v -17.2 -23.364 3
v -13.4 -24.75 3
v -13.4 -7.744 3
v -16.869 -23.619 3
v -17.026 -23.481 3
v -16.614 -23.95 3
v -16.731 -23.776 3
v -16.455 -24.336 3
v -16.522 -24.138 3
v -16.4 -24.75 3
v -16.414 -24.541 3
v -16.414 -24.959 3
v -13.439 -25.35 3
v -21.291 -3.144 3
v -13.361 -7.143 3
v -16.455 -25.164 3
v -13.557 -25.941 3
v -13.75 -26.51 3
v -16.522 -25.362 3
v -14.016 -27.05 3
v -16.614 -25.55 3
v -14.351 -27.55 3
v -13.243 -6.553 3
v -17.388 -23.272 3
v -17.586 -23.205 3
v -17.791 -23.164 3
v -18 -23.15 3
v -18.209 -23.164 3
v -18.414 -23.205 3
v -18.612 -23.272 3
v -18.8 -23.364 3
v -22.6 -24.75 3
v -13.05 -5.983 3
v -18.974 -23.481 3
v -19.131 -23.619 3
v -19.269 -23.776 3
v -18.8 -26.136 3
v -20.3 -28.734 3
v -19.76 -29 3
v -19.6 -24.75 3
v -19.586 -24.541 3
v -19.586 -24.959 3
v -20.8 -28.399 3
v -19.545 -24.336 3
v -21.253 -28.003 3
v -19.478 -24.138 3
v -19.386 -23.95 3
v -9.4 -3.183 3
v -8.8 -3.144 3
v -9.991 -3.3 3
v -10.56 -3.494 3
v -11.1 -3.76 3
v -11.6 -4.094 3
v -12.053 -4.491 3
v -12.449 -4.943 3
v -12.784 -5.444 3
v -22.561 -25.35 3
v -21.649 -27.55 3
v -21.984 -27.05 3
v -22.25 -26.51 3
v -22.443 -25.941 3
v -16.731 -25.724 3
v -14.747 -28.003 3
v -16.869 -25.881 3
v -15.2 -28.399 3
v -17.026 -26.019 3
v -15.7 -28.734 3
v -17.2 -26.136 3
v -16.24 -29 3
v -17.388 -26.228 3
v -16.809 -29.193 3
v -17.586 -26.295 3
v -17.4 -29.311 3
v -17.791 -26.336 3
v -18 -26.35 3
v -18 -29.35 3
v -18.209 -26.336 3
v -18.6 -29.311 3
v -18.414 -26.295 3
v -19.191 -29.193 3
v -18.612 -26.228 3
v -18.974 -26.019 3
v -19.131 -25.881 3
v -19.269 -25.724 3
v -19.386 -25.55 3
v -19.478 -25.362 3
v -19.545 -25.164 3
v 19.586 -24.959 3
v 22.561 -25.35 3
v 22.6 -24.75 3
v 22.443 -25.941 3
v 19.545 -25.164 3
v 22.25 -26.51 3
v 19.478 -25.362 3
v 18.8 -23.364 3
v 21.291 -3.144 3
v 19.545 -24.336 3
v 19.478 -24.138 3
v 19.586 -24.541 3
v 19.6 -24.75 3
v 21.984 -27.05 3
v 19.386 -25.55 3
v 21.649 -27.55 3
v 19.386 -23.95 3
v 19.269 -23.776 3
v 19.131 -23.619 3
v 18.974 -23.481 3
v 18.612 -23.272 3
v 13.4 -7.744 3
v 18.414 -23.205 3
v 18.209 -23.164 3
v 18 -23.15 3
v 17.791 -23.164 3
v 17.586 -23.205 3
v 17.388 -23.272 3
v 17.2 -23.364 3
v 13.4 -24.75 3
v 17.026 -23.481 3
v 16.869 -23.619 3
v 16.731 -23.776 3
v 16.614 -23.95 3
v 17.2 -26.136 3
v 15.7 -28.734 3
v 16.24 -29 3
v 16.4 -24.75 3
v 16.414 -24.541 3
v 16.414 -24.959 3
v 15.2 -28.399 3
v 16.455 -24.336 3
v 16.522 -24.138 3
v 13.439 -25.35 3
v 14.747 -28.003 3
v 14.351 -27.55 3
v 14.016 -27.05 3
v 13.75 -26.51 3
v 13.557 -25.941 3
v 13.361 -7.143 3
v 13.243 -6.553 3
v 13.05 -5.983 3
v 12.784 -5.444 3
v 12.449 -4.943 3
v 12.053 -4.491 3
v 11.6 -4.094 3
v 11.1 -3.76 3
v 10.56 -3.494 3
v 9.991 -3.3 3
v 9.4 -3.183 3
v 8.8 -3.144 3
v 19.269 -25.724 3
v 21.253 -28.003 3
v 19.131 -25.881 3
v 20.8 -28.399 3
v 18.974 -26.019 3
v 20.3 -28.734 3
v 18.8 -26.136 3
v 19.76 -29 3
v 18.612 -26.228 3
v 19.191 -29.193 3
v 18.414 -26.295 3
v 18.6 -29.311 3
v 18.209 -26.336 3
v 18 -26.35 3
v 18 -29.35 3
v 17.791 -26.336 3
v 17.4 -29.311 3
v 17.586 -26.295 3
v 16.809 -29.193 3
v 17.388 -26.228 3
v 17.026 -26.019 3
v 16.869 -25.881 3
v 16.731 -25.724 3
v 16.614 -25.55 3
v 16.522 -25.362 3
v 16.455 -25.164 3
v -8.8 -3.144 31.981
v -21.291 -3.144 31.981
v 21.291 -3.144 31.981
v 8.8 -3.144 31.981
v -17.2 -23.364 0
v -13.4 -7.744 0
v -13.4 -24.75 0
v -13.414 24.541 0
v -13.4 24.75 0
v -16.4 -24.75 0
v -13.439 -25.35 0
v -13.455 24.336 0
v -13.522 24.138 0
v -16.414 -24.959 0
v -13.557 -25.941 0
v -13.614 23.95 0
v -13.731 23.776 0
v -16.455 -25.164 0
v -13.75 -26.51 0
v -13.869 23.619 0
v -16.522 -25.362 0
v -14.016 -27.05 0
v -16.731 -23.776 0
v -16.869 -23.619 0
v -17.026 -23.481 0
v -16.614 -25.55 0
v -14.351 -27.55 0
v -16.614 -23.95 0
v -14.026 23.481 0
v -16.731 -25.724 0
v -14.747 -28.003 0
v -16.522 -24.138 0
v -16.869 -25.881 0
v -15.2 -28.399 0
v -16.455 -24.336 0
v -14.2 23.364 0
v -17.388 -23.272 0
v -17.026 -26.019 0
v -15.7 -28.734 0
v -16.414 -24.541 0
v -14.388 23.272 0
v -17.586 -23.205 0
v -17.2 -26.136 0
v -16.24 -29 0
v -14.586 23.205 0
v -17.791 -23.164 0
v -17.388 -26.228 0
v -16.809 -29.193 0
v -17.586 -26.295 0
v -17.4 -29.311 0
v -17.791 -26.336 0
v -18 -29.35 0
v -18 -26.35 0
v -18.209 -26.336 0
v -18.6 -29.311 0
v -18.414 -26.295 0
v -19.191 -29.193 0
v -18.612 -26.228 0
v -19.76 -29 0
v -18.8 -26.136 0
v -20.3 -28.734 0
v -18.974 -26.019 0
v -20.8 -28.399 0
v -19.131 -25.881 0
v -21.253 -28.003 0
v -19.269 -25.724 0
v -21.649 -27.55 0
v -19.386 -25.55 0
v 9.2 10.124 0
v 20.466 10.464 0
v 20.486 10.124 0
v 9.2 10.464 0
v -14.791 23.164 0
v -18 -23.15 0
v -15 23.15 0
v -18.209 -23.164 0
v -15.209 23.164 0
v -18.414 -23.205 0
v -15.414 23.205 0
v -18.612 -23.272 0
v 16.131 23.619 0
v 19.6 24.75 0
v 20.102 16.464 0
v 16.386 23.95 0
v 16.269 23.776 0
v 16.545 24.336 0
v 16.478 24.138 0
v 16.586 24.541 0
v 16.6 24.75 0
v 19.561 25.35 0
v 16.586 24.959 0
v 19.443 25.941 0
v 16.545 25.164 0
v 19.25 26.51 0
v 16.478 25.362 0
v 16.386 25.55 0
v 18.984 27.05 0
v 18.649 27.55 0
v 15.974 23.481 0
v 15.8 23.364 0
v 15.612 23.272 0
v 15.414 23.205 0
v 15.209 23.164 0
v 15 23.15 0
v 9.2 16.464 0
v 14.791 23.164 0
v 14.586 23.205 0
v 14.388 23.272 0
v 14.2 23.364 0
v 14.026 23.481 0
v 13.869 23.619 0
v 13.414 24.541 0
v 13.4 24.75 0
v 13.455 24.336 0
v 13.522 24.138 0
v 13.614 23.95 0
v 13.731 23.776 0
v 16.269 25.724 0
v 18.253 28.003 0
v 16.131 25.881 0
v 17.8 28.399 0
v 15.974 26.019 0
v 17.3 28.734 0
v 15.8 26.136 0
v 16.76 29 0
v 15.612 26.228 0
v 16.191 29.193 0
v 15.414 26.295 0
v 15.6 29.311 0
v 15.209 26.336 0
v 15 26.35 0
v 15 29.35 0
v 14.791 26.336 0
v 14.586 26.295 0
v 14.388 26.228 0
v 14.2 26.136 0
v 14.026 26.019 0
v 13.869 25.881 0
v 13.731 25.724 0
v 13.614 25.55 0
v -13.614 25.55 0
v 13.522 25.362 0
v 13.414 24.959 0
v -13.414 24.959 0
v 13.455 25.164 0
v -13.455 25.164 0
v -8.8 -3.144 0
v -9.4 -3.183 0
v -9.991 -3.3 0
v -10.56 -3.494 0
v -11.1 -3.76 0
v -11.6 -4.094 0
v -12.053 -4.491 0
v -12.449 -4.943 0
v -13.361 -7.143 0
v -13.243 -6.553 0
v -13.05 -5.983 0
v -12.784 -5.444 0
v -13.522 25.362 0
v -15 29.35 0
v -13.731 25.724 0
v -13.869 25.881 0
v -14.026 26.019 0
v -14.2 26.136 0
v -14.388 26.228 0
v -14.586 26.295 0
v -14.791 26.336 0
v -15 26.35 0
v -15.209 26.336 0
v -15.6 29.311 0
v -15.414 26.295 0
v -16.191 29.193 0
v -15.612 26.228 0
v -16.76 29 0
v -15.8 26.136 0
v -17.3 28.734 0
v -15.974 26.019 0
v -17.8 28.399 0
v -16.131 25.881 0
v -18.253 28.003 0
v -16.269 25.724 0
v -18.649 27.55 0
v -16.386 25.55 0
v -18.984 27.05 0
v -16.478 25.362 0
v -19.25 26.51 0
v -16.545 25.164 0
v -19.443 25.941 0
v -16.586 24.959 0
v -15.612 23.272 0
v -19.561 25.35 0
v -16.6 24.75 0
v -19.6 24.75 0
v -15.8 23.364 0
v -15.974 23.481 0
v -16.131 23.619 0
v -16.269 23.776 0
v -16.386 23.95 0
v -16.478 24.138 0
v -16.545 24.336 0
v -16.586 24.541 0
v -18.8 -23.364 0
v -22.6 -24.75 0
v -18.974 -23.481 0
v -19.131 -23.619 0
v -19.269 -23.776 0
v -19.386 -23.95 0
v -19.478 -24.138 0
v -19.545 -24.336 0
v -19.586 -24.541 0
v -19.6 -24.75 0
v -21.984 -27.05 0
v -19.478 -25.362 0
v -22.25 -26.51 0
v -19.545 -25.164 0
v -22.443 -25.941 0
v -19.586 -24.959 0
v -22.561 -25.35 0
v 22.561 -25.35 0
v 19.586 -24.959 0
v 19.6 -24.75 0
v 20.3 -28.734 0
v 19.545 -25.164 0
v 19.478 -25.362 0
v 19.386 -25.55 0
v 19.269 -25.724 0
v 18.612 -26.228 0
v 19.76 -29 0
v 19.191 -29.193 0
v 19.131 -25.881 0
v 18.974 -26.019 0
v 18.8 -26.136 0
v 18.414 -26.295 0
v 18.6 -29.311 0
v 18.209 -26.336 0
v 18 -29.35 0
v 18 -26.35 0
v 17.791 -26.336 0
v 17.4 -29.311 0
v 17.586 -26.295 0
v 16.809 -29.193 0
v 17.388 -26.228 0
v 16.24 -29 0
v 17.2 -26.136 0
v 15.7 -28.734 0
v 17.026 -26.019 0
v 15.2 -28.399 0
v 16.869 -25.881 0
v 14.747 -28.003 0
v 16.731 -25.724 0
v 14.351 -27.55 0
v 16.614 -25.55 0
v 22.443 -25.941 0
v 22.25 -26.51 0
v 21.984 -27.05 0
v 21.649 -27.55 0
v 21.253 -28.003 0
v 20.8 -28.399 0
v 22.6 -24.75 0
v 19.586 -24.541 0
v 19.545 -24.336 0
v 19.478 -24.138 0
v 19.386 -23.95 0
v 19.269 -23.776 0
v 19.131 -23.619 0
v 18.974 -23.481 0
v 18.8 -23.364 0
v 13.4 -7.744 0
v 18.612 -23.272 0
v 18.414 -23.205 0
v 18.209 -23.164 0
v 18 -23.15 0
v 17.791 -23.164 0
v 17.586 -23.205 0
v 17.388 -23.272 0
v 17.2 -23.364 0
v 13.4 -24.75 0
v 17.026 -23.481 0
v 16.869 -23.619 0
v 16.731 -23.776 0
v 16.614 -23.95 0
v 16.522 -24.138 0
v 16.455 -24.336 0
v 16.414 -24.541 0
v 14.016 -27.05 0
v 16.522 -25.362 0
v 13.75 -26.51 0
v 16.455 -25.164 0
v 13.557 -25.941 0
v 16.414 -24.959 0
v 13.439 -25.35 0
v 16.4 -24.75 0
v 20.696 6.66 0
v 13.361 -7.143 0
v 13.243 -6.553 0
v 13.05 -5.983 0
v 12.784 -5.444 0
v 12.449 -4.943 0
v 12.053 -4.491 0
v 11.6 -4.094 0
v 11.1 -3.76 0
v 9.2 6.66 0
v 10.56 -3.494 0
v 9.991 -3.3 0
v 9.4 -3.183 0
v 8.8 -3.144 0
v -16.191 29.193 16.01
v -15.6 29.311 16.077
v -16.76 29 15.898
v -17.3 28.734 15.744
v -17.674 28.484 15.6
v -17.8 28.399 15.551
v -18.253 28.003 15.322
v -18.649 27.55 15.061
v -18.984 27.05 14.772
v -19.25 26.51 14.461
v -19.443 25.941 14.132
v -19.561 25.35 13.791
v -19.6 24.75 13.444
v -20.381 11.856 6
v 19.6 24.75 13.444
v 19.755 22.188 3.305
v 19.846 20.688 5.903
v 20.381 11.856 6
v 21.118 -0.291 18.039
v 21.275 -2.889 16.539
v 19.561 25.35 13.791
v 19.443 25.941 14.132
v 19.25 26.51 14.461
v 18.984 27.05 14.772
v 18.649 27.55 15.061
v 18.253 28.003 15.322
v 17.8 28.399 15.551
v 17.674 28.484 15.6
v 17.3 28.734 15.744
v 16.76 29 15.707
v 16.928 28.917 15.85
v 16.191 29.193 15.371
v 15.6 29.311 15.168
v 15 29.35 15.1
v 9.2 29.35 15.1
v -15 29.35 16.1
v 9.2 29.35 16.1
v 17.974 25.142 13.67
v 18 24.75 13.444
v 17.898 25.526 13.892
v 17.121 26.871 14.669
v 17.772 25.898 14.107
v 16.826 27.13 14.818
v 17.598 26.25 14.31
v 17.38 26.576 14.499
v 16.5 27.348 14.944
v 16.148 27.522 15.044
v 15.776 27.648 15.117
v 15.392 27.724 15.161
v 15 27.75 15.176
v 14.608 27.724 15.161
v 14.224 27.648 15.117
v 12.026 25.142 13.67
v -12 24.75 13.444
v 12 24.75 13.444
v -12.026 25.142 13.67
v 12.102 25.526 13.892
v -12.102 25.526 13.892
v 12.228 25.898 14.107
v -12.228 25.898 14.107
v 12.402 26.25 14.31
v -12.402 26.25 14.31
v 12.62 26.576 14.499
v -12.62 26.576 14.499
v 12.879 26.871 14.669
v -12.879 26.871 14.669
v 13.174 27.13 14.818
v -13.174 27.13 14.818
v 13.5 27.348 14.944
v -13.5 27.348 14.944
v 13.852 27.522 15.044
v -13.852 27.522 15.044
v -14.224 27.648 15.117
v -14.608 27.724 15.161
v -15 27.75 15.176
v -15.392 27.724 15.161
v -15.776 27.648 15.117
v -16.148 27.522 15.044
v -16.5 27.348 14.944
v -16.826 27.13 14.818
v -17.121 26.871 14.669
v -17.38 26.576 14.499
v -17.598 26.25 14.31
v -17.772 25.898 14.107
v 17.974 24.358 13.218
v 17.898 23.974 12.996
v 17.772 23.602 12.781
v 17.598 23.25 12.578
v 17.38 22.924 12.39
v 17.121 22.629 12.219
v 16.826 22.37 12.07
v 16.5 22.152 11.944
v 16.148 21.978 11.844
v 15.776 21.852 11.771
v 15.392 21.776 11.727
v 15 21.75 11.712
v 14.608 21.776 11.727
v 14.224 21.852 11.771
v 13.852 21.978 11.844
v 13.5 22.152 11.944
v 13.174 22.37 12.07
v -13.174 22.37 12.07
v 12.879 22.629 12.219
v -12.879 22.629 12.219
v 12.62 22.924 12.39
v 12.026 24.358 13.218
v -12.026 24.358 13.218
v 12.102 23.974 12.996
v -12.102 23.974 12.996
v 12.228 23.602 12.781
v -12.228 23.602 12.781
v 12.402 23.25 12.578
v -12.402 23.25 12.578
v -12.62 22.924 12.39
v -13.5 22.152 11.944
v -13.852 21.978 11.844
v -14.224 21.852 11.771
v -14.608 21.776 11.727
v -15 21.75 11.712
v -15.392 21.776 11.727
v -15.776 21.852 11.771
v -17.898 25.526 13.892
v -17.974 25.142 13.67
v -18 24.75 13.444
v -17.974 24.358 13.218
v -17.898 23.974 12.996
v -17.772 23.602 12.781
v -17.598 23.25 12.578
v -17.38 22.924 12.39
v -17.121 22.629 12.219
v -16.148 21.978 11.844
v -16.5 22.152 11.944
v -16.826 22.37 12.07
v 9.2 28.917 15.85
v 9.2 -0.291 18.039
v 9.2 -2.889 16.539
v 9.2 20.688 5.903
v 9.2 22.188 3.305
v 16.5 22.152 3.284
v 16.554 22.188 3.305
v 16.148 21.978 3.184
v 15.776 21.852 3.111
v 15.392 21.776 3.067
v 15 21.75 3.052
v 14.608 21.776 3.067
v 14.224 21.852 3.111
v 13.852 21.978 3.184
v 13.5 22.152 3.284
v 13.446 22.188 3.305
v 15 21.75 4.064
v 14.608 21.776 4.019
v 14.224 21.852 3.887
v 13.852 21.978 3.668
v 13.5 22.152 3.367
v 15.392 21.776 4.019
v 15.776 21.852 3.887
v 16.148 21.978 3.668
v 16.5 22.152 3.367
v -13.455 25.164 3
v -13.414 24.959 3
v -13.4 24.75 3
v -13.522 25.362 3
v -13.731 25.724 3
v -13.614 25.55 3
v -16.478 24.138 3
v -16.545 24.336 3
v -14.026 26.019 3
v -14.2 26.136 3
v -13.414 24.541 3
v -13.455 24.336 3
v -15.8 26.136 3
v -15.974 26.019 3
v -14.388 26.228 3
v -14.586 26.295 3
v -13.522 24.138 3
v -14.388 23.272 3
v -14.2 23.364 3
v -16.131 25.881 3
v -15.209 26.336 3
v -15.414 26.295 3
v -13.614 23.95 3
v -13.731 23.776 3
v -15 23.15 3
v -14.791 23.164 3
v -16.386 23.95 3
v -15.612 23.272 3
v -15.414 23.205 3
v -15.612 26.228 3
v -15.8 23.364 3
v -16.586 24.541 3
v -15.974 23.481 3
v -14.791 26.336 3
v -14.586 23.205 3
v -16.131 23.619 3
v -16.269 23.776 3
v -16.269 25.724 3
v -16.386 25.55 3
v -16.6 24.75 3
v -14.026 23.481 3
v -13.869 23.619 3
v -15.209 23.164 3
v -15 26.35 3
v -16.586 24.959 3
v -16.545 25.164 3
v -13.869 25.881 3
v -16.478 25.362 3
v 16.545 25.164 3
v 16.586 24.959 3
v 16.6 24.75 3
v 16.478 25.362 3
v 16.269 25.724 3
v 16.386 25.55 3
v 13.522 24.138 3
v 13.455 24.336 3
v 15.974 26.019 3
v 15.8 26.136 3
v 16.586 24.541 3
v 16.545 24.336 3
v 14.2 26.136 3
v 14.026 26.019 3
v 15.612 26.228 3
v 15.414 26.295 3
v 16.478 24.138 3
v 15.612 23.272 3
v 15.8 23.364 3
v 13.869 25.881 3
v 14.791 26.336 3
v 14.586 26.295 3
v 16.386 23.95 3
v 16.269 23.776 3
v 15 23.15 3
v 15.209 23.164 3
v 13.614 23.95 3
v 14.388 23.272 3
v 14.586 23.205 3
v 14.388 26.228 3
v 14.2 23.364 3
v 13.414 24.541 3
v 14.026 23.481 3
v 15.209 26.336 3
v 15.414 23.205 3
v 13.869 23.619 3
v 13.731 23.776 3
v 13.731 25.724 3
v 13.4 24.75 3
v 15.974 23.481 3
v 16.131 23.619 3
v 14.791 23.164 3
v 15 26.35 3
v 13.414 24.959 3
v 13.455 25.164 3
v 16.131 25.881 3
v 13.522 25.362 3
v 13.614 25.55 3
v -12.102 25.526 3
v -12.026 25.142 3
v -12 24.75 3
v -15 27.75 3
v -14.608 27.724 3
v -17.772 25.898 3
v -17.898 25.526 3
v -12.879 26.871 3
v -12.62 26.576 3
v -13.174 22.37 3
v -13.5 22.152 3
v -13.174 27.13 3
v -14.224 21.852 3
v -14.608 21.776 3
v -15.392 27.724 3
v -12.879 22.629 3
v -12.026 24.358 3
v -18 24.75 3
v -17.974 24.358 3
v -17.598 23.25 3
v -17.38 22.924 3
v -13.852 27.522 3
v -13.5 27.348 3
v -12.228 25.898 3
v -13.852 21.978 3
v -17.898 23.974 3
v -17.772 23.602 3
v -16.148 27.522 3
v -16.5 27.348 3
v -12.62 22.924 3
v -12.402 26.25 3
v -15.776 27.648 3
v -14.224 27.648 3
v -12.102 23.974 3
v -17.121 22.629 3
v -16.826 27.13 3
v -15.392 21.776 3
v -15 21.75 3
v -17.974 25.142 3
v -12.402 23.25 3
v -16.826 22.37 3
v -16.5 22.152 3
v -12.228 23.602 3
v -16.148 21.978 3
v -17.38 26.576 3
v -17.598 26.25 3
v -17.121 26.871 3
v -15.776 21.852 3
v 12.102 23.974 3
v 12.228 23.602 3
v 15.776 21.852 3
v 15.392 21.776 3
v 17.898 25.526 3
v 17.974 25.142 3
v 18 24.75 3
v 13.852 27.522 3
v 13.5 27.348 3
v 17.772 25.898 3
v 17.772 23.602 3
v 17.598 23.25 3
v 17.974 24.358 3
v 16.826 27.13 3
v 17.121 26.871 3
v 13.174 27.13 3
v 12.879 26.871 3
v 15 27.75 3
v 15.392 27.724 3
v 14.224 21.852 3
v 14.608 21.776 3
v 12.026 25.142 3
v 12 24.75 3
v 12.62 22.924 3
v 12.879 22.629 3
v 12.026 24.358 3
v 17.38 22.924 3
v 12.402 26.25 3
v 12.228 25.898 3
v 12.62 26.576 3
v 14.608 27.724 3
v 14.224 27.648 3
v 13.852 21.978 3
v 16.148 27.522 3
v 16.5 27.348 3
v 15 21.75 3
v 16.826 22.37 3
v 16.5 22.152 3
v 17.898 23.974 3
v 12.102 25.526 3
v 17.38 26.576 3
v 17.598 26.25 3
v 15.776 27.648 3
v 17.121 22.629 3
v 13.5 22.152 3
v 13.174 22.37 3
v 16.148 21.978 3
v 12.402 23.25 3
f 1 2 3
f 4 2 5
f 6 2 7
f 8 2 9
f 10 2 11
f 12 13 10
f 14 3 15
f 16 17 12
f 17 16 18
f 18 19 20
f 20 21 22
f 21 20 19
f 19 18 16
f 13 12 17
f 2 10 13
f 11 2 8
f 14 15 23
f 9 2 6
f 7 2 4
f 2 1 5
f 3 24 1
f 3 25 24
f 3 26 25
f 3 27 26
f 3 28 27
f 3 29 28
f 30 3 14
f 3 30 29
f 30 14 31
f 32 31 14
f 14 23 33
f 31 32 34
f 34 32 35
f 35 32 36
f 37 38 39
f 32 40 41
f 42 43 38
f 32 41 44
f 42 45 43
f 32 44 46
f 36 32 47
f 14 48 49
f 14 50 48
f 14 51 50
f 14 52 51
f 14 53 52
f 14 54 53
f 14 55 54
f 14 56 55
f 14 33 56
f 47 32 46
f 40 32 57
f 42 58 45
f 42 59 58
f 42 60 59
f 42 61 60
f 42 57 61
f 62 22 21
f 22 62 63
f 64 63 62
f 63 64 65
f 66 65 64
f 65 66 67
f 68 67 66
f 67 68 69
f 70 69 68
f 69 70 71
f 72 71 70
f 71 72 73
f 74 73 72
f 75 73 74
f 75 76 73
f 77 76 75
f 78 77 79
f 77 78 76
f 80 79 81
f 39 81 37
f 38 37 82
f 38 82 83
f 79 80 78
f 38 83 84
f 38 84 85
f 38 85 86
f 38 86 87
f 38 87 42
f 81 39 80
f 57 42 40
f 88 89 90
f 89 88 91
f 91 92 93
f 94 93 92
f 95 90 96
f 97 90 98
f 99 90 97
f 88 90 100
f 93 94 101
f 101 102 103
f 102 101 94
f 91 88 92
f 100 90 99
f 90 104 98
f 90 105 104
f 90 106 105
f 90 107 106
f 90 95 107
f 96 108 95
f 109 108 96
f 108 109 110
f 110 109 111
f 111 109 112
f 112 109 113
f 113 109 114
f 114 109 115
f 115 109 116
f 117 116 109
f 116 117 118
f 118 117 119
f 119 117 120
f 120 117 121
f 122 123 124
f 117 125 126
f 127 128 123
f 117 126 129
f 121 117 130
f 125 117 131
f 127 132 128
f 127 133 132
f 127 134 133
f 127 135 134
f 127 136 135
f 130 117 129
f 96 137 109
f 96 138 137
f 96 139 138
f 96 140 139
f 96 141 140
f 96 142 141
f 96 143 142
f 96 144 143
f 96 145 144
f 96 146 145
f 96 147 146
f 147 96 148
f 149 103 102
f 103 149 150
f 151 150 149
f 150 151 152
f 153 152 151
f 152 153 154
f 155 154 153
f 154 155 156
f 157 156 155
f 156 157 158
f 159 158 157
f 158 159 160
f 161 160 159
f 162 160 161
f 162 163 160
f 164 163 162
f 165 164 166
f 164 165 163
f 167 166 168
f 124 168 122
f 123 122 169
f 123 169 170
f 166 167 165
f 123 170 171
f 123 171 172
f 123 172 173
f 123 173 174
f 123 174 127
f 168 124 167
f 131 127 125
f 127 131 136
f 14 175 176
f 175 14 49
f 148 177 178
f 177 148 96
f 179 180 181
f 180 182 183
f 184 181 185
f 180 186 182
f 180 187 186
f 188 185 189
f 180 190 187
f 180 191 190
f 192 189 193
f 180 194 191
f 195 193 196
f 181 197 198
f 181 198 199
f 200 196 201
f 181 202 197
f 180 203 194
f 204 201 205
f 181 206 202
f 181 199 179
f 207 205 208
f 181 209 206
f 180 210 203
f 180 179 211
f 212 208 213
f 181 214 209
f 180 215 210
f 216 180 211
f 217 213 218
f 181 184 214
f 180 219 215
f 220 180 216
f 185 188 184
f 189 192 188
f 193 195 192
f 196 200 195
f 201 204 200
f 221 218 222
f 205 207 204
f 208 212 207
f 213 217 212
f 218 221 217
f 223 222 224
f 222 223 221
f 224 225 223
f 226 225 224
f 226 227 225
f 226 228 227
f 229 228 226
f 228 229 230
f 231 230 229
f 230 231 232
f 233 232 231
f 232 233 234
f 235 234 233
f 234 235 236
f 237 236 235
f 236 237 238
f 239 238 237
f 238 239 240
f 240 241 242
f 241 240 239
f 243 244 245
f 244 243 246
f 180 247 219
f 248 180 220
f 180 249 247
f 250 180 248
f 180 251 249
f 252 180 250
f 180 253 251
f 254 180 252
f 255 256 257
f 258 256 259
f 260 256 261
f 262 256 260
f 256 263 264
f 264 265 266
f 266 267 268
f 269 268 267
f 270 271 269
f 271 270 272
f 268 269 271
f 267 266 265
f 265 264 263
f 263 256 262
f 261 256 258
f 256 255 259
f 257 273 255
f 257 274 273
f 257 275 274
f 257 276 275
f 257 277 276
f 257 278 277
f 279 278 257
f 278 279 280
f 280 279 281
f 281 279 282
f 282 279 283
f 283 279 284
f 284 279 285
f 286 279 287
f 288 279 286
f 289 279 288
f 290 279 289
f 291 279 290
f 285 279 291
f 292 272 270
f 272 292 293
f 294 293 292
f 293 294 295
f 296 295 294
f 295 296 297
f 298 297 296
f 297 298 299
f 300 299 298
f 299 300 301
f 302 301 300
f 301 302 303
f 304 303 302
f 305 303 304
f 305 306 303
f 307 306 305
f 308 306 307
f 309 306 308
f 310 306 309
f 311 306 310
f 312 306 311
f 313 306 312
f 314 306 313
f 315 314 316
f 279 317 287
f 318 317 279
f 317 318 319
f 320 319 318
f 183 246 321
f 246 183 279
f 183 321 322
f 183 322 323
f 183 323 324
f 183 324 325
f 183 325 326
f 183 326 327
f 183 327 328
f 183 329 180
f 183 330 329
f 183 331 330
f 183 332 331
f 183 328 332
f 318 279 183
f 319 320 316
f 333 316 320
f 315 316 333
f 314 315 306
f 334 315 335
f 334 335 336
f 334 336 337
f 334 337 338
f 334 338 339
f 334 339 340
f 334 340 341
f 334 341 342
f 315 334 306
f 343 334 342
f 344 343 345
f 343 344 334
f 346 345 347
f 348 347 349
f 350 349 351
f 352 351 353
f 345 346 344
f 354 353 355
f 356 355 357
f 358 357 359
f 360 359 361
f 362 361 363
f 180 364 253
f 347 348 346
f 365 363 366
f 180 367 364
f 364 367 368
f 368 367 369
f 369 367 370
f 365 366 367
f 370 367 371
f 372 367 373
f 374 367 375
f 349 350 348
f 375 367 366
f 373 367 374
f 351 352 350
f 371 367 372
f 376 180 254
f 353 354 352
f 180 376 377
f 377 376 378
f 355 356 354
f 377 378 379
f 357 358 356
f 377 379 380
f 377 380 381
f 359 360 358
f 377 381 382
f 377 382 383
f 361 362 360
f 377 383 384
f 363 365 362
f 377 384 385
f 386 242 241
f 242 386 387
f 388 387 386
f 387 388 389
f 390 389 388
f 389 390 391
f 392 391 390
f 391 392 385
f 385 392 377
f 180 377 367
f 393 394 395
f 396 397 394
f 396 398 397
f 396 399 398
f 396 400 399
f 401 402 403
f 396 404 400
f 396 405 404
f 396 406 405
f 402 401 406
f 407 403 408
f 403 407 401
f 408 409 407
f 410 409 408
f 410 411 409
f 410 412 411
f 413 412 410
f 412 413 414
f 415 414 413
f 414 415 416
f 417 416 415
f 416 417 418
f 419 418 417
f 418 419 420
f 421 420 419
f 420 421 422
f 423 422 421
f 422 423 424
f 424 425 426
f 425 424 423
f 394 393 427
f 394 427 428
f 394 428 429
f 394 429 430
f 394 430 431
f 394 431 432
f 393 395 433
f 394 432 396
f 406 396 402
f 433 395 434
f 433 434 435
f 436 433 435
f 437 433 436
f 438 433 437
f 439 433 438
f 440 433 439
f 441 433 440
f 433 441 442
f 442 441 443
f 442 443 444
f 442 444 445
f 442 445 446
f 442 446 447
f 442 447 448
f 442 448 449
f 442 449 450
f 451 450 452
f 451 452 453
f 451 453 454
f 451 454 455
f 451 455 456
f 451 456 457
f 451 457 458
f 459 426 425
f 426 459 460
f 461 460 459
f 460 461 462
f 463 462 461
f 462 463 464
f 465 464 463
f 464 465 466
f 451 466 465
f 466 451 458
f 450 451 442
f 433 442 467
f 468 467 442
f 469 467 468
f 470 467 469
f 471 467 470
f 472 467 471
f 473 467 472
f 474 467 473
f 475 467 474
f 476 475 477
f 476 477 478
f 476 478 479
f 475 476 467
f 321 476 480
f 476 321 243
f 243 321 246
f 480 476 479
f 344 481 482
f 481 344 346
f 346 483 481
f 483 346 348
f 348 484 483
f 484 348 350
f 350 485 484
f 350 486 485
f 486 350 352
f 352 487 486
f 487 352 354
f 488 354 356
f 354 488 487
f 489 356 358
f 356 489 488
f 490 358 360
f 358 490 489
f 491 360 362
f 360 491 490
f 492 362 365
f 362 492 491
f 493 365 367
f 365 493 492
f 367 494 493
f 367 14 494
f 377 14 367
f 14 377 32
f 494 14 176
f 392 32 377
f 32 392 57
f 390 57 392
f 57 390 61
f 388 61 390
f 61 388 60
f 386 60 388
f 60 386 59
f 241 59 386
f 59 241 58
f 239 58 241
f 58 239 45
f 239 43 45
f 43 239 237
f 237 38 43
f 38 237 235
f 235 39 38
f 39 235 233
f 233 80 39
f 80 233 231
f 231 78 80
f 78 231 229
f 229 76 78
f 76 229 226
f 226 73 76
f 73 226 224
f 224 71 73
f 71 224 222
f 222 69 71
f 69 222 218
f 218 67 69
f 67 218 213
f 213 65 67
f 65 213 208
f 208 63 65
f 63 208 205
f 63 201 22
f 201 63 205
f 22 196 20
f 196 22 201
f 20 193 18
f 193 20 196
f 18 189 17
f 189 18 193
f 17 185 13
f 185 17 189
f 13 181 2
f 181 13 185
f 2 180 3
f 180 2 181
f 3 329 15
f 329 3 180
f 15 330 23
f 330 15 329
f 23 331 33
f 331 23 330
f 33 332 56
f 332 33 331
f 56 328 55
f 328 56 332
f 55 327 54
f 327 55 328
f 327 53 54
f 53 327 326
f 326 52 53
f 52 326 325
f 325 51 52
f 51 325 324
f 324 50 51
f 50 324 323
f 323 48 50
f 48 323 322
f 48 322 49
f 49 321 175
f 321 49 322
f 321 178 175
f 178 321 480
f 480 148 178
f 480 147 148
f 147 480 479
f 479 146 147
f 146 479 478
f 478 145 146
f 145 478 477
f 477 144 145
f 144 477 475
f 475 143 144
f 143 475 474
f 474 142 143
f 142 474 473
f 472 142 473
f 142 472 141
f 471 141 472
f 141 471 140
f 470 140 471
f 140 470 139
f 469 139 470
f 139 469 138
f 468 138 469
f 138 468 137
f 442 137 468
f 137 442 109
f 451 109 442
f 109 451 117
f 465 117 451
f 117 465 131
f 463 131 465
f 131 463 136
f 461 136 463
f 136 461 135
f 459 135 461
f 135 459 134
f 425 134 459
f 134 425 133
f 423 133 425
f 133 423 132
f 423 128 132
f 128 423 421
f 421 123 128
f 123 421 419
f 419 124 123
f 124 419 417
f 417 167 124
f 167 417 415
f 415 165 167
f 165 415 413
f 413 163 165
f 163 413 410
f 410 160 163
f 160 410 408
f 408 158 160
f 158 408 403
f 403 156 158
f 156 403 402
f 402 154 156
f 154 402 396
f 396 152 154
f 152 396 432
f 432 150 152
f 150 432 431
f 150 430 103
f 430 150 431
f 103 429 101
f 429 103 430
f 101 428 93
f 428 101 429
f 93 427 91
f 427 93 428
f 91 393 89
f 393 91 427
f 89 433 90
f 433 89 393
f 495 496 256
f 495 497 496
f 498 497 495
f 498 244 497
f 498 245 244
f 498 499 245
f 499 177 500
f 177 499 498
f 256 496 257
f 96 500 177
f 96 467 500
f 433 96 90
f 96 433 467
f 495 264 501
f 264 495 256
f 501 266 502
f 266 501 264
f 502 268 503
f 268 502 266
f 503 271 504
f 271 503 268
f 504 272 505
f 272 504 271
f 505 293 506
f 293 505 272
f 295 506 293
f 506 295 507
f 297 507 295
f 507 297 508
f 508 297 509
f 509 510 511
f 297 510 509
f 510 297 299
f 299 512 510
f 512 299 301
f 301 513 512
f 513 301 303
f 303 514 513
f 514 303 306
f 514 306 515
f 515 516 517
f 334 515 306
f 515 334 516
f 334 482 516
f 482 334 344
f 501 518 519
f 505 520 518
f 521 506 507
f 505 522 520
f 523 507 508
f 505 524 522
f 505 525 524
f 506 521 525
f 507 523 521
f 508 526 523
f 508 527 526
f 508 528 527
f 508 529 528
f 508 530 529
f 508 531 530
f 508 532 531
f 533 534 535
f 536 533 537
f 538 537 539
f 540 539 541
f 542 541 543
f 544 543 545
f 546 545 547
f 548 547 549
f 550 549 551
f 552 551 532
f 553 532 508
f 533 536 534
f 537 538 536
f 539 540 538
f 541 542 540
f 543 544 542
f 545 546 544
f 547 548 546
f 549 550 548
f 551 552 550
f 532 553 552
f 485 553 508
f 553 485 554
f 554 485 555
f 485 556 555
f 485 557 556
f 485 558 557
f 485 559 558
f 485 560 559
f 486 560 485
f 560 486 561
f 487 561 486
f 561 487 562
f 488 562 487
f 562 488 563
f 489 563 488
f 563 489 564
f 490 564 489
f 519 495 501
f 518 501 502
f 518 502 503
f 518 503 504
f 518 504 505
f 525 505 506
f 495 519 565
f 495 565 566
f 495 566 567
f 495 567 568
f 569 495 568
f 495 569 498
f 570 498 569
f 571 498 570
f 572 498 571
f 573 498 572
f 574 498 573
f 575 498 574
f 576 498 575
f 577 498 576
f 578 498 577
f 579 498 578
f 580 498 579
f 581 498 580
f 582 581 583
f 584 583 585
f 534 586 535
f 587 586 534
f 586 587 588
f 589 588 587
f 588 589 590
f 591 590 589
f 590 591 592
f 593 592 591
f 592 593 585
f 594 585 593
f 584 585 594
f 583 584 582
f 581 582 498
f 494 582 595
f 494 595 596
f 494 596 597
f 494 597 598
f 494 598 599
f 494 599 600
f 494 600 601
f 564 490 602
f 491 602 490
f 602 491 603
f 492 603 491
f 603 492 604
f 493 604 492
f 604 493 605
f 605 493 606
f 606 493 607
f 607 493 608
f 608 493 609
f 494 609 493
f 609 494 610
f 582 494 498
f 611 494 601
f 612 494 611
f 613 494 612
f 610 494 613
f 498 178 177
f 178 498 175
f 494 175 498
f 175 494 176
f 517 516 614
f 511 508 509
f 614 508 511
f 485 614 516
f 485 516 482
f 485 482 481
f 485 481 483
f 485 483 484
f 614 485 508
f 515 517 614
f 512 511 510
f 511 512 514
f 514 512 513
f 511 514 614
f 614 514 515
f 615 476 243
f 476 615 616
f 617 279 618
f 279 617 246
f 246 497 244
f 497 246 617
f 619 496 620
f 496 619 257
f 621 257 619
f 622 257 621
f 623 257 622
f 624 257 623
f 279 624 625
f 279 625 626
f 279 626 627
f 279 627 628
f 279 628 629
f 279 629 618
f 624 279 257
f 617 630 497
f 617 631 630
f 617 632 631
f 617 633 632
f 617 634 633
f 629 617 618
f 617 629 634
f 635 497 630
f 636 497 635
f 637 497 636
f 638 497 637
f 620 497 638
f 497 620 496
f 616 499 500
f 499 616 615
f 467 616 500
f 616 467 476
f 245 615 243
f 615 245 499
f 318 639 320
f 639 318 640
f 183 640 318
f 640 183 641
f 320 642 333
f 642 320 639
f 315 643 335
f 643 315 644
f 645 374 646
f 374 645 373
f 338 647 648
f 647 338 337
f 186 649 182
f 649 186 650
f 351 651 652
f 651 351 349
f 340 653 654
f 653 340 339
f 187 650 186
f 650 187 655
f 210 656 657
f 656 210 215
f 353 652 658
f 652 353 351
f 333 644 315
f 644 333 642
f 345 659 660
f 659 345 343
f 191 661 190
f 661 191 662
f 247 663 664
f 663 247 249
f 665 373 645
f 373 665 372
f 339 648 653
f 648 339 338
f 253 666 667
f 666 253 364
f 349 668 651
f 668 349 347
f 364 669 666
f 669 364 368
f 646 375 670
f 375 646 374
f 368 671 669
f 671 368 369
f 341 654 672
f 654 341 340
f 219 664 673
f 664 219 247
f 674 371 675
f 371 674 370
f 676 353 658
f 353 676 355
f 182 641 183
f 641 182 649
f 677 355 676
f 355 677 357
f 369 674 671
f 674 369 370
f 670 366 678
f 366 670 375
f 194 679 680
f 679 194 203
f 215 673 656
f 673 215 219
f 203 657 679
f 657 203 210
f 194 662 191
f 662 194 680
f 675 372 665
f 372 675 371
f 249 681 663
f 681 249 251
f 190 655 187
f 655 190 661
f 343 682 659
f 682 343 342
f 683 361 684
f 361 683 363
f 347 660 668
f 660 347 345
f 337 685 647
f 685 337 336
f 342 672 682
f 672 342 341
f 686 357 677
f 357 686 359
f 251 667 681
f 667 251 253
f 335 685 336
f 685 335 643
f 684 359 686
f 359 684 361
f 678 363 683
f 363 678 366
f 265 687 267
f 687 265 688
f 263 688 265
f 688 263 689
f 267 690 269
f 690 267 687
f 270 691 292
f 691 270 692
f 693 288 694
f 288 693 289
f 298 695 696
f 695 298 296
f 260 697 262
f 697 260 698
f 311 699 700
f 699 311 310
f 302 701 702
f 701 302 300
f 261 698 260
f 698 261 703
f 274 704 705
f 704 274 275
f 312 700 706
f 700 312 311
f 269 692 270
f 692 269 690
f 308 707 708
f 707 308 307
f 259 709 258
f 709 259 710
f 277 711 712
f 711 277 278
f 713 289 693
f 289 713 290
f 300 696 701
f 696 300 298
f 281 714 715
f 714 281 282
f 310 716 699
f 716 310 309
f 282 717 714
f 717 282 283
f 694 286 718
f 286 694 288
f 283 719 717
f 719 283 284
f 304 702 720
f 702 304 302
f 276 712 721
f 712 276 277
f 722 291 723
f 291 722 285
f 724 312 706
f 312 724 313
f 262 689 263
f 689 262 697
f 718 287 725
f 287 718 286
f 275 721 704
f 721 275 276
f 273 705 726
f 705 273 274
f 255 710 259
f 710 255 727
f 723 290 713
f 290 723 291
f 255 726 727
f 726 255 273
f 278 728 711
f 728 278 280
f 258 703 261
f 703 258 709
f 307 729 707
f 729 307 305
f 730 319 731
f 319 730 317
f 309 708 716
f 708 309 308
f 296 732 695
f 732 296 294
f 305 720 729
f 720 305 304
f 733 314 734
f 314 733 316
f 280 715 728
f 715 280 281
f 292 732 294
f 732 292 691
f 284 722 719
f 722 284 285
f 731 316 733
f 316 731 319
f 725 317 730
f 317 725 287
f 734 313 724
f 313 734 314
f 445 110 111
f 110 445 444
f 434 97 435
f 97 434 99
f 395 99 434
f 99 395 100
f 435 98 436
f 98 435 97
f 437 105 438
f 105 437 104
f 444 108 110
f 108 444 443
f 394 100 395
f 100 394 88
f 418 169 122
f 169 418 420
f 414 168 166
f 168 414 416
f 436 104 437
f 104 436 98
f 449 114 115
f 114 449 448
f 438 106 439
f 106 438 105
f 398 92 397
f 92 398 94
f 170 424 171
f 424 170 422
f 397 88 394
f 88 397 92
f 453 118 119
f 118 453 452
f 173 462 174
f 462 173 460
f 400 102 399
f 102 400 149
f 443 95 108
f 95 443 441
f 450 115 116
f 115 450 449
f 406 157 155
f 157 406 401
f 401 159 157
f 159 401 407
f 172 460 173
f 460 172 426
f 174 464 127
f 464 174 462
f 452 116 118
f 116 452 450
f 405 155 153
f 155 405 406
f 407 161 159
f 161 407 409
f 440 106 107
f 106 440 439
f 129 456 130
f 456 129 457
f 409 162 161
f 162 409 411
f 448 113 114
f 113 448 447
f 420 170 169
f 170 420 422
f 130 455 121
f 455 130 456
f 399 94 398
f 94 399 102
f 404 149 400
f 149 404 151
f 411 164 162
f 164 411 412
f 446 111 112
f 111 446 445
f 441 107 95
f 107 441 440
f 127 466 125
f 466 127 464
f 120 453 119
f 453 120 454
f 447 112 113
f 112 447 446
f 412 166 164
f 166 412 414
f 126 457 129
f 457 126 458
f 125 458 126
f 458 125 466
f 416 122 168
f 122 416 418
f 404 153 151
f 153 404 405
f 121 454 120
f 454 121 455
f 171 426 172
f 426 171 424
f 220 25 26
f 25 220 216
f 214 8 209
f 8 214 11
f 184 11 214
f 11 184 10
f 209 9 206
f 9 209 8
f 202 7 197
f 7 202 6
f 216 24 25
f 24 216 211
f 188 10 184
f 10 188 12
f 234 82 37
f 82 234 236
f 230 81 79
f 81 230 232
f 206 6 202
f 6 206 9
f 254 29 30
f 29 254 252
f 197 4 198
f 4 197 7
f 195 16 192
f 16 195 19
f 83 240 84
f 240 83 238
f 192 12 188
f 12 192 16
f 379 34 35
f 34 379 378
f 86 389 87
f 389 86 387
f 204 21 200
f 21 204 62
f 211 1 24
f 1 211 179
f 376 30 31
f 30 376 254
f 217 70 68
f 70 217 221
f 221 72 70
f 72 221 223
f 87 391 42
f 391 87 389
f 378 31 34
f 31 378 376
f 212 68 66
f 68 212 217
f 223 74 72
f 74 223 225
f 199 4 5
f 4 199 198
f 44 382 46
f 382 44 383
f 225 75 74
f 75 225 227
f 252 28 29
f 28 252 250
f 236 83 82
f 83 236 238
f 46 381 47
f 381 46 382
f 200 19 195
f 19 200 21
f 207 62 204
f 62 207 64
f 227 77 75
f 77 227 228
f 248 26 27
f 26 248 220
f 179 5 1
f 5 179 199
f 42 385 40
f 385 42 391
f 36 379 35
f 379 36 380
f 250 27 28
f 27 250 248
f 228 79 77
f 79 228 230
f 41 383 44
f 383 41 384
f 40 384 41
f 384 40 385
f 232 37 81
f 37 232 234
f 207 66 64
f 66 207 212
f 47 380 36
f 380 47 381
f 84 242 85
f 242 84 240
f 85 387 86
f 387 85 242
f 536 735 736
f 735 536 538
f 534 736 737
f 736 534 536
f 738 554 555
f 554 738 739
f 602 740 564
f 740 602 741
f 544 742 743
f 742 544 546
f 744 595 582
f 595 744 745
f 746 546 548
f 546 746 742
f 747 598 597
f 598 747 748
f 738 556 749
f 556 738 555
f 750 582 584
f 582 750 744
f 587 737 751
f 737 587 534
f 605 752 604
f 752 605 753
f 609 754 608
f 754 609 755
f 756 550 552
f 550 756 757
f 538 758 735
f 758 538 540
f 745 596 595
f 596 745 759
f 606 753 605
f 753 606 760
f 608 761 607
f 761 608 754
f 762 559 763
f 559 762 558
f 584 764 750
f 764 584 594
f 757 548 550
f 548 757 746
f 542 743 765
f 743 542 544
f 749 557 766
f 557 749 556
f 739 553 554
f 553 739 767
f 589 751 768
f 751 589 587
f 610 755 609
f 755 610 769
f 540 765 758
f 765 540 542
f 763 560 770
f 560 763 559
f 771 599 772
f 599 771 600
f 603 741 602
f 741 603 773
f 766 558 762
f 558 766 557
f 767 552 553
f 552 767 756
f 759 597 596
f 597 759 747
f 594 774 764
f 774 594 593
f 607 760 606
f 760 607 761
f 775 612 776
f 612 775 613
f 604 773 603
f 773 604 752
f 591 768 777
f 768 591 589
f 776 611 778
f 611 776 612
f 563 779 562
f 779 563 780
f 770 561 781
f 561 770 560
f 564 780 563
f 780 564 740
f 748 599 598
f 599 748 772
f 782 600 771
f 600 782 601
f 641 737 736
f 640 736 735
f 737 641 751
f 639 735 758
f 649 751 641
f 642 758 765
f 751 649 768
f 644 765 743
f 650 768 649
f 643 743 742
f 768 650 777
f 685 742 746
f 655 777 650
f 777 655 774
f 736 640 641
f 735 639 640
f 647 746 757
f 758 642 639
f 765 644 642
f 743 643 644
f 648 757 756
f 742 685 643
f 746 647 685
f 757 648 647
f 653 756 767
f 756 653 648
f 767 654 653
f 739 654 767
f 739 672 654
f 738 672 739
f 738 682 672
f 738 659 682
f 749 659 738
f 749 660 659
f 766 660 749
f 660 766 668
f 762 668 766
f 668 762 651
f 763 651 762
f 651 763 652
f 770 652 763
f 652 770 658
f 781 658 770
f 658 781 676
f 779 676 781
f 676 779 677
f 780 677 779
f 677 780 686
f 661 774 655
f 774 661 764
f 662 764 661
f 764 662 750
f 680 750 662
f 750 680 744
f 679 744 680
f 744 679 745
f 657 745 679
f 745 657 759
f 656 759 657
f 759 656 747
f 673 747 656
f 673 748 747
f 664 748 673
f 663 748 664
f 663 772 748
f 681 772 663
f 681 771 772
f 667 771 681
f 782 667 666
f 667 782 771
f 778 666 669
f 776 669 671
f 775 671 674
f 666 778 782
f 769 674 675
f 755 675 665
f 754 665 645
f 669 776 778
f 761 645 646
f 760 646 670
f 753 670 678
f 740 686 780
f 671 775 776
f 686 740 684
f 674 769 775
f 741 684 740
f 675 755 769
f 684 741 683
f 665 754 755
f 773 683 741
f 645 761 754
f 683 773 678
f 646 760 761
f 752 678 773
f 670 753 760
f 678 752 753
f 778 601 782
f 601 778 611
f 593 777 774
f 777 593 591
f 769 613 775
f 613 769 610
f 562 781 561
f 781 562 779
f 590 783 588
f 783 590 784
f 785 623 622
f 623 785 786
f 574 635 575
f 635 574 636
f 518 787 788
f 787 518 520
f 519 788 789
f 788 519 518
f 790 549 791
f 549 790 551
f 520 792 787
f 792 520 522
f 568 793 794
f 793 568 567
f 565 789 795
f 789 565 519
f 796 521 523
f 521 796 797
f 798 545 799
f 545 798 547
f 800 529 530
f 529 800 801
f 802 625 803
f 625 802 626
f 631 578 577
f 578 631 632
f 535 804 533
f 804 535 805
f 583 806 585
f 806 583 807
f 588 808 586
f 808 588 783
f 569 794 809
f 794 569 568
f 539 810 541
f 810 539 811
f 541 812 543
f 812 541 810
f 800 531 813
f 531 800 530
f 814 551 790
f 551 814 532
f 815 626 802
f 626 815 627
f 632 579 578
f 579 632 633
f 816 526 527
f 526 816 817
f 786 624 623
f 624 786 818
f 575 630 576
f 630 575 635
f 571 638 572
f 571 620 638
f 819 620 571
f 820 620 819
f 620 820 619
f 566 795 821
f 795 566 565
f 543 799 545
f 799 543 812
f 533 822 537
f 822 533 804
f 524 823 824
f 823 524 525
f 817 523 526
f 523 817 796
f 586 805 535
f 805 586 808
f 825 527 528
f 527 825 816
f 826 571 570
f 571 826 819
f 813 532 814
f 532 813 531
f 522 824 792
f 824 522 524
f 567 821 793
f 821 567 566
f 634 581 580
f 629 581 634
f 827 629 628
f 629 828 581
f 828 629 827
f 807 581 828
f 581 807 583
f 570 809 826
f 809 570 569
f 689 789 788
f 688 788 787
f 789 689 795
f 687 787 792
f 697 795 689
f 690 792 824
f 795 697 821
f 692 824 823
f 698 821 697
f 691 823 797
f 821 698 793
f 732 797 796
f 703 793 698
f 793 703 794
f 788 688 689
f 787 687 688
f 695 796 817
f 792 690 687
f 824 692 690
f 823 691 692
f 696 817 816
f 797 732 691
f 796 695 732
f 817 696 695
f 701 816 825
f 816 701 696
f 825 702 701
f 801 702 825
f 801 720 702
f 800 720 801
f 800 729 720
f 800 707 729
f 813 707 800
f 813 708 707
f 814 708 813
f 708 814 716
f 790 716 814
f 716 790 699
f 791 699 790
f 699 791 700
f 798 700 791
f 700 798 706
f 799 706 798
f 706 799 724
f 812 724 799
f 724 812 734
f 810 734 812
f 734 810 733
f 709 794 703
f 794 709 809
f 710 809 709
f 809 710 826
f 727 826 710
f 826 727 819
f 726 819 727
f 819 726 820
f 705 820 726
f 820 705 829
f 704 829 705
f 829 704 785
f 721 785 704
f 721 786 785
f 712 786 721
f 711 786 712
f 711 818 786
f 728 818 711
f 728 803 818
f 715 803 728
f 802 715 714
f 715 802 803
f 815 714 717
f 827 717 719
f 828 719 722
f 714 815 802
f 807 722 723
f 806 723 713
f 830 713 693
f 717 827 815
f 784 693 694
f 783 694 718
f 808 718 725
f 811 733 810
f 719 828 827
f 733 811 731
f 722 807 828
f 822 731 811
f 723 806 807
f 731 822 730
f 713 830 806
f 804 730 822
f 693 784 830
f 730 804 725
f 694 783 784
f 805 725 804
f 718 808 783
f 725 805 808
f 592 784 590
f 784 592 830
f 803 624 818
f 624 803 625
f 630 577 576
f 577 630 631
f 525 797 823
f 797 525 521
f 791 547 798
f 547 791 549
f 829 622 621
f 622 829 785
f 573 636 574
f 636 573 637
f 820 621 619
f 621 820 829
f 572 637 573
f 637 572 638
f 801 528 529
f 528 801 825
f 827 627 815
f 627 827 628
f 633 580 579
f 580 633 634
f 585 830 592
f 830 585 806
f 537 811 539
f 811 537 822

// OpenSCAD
//Depth of camera
camera_depth = 20.2;
//Height of the supporting back
back_height = 30;
//C/C Distance between front holes
front_cc = 30;
//C/C Distance between rear holes
rear_cc = 36;
//C/C Distance between front and rear holes
front_rear_cc = 49.5;
//angle of camera
angle = 30; //[10:45]
//Thickness of the base
base_thickness = 3;
//Hole diameter (may need adjustment depending on printer)
hole_size = 3.2;
//Determines the amount of "meat" around the holes
edge_margin = 3;
//Diameter of screw head (to allow enough clerance)
screw_head_size = 6;
//Wedge offset from front
front_offset = 0;
//Add lip to fron of wedge
use_lip = "No"; //[Yes,No]
//Velcro strap width
velcro_width = 18;
//Velcro strap thickness
velcro_thickness = 3;
//Added height under the camera e.g. for prop clearence
added_height = 0;


//Calculated variables wont be visible to Thingiverse customizer
hole_clearence = edge_margin+hole_size/2;
screw_head_clerance = screw_head_size / 2;
hole_radius = hole_size / 2;
lip_thickness = use_lip == "Yes" ? 2*1 : 0*1;
lip_height =  use_lip == "Yes" ? 2*1 : 0*1;

//internal global varaibles
_xFrontOffset = front_cc/2;
_xRearOffset = rear_cc/2;
_xTotFrontOffset = front_cc/2+hole_clearence;
_xTotRearOffset = rear_cc/2+hole_clearence;
_yOffset = front_rear_cc/2;
_yTotOffset = front_rear_cc/2+hole_clearence;
_cameraHolderDepth = (lip_thickness+camera_depth)*cos(angle)+back_height*sin(angle)+lip_thickness;
_cameraHolderHeight = back_height*cos(angle) + base_thickness + velcro_thickness + added_height;
_wedgeStartYoffset = _yTotOffset - front_offset;
_wedgeEndYoffset = _yTotOffset - front_offset - _cameraHolderDepth;
_rearSpaceLeft = _yTotOffset * 2 - front_offset - _cameraHolderDepth;
_totWidth = front_cc > rear_cc ? front_cc + hole_clearence*2 : rear_cc + hole_clearence*2;
_velcroXpos = (velcro_width + edge_margin) < (front_cc+2*edge_margin+hole_size) / 2 ? 0 :  ((front_cc+2*edge_margin+hole_size) / 1 )-(velcro_width + edge_margin);

module createBase()
{   
           
    difference()
    {
        linear_extrude( height = _cameraHolderHeight)
        {
            union()
            {
                if( front_offset > 0 )
                {
                    polygon(
                                points = [  [-_xTotFrontOffset, _yOffset],
                                            [-_xFrontOffset+hole_clearence, _yOffset],
                                            [-_xFrontOffset+hole_clearence, _wedgeStartYoffset],
                                            [_xFrontOffset-hole_clearence, _wedgeStartYoffset],
                                            [_xFrontOffset-hole_clearence, _yOffset],
                                            [_xTotFrontOffset, _yOffset], 
                                            [_xTotRearOffset, -_yOffset], 
                                            [_xRearOffset-hole_clearence, -_yOffset], 
                                            [_xRearOffset-hole_clearence, _wedgeEndYoffset], 
                                            [-_xRearOffset+hole_clearence, _wedgeEndYoffset], 
                                            [-_xRearOffset+hole_clearence, -_yOffset], 
                                            [-_xTotRearOffset, -_yOffset] ], 
                                convexity = 10);
                } else {
                    polygon(
                                points = [  [-_xFrontOffset, _yOffset+hole_clearence],                                        [_xFrontOffset, _yOffset+hole_clearence], 
                                            [_xTotFrontOffset, _yOffset], 
                                            [_xTotRearOffset, -_yOffset], 
                                            [_xRearOffset-hole_clearence, -_yOffset], 
                                            [_xRearOffset-hole_clearence, _wedgeEndYoffset], 
                                            [-_xRearOffset+hole_clearence, _wedgeEndYoffset], 
                                            [-_xRearOffset+hole_clearence, -_yOffset], 
                                            [-_xTotRearOffset, -_yOffset],
                                            [-_xTotFrontOffset, _yOffset]],
                                convexity = 10);
                }
                translate([-_xFrontOffset, _yOffset, 0])
                circle(r=hole_clearence, center = false); 
                translate([_xFrontOffset, _yOffset, 0])
                circle(r=hole_clearence, center = false); 
                translate([_xRearOffset, -_yOffset, 0])
                circle(r=hole_clearence, center = false); 
                translate([-_xRearOffset, -_yOffset, 0])
                circle(r=hole_clearence, center = false); 
                if(front_offset > hole_clearence*2)
                {
                    difference()
                    {
                        union()
                        {
                            translate([_xFrontOffset-hole_clearence*2, _wedgeStartYoffset, 0])
                            square([hole_clearence,hole_clearence]);
                            translate([-_xFrontOffset+hole_clearence, _wedgeStartYoffset, 0])
                            square([hole_clearence,hole_clearence]);
                        }
                        union()
                        {
                            translate([_xFrontOffset-hole_clearence*2, _wedgeStartYoffset+hole_clearence, 0])
                            circle(r=hole_clearence, center = false); 
                            translate([-_xFrontOffset+hole_clearence*2, _wedgeStartYoffset+hole_clearence, 0])                circle(r=hole_clearence, center = false);   
                        }
                    }
                }
                if((_yTotOffset + _wedgeEndYoffset) > hole_clearence*2)
                {
                    difference()
                    {
                        union()
                        {
                            translate([_xRearOffset-hole_clearence*2, _wedgeEndYoffset-hole_clearence, 0])
                            square([hole_clearence,hole_clearence]);
                            translate([-_xRearOffset+hole_clearence, _wedgeEndYoffset-hole_clearence, 0])
                            square([hole_clearence,hole_clearence]);
                            
                        }
                        union()
                        {
                            translate([_xRearOffset-hole_clearence*2, _wedgeEndYoffset-hole_clearence, 0])
                            circle(r=hole_clearence, center = false); 
                            translate([-_xRearOffset+hole_clearence*2, _wedgeEndYoffset-hole_clearence, 0])
                            circle(r=hole_clearence, center = false); 
                        }
                    }
                }
            }
        }
        union()
        {
            translate([-_totWidth/2, _wedgeStartYoffset, base_thickness])
            cube([_totWidth,front_rear_cc,_cameraHolderHeight], center = false);
            rearSpace = _yTotOffset + _wedgeEndYoffset;
            translate([-_totWidth/2, _wedgeEndYoffset-rearSpace, base_thickness])
            cube([_totWidth,rearSpace,_cameraHolderHeight], center = false);
        }
    }    
}

module addWedge()
{
    totWidth = front_cc > rear_cc ? front_cc + edge_margin*2+hole_size: rear_cc + edge_margin*2+hole_size;
                xOffset = totWidth/2;  
    difference()
    {
        difference()
        {
            children();
            union()
            {
                          
                yOffset = (front_rear_cc/2+edge_margin+hole_size/2)-(lip_thickness+camera_depth)*cos(angle) -front_offset;
                translate([-xOffset, yOffset, base_thickness+velcro_thickness+added_height])
                rotate([angle,0,0])
                cube([totWidth, camera_depth, back_height+5], center = false);
                
            }
        }
       
        union()
       {
           yOffset = (front_rear_cc/2+edge_margin+hole_size/2)-lip_thickness*cos(angle) -front_offset; 
                zOffset = base_thickness+velcro_thickness + camera_depth*sin(angle) + added_height;
                translate([-xOffset, yOffset, zOffset])
                rotate([angle,0,0])
                translate([0, -1, lip_height])
                cube([totWidth, front_rear_cc, back_height+5], center = false);
                translate([-xOffset, yOffset, zOffset])
                rotate([angle,0,0])
                translate([0, lip_thickness, 0])
                cube([totWidth, front_rear_cc, back_height+5], center = false);
       }
    }
}

module addStrapHole()
{
    difference()
    {
        children();
        union()
        {
            yOffset = (front_rear_cc/2+edge_margin+hole_size/2)-lip_thickness*cos(angle) -front_offset; 
            zOffset = base_thickness+velcro_thickness + camera_depth*sin(angle);
            translate([0, yOffset, zOffset+added_height])
            rotate([angle,0,0])
            translate([_velcroXpos, 0, -zOffset+base_thickness])
            cube([velcro_width, lip_thickness+1, zOffset*2], center = true);
            ySize = camera_depth + base_thickness + velcro_thickness;
            translate([0, yOffset, zOffset])
            rotate([angle,0,0])            
            translate([_velcroXpos, -ySize, -base_thickness-velcro_thickness])
            cube([velcro_width, ySize+1, velcro_thickness], center = true);
            translate([0, yOffset, zOffset])
            rotate([angle,0,0])            
            translate([_velcroXpos, -ySize, -base_thickness-velcro_thickness])            
            cube([velcro_width, velcro_thickness, back_height*1.5], center = true);
            
        }
    }
}

module clearForScrews()
{
    xOffsetFront = front_cc/2;
    xOffsetRear = rear_cc/2;
    yOffset = front_rear_cc/2;
    
    difference()
    {
        children();
        union()
        {
            //Screw holes
            translate([-xOffsetFront, yOffset, (base_thickness+1)/2])
            cylinder(h=base_thickness+1, r=hole_radius, center = true); 
            translate([xOffsetFront, yOffset, (base_thickness+1)/2])
            cylinder(h=base_thickness+1, r=hole_radius, center = true); 
            translate([xOffsetRear, -yOffset, (base_thickness+1)/2])
            cylinder(h=base_thickness+1, r=hole_radius, center = true); 
            translate([-xOffsetRear, -yOffset, (base_thickness+1)/2])
            cylinder(h=base_thickness+1, r=hole_radius, center = true); 
            translate([xOffsetRear, -yOffset, 50+base_thickness])
            cylinder(h=100, r=screw_head_clerance, center = true);        translate([-xOffsetRear, -yOffset, 50+base_thickness])
            cylinder(h=100, r=screw_head_clerance, center = true);
            translate([-xOffsetFront, yOffset, 50+base_thickness])
            cylinder(h=100, r=screw_head_clerance, center = true);
            translate([xOffsetFront, yOffset, 50+base_thickness])
            cylinder(h=100, r=screw_head_clerance, center = true);             
        }
    }
}


$fn = 48;
clearForScrews()
{
    addStrapHole()
    {
        addWedge()
        {
            createBase();
        }
    }
}
